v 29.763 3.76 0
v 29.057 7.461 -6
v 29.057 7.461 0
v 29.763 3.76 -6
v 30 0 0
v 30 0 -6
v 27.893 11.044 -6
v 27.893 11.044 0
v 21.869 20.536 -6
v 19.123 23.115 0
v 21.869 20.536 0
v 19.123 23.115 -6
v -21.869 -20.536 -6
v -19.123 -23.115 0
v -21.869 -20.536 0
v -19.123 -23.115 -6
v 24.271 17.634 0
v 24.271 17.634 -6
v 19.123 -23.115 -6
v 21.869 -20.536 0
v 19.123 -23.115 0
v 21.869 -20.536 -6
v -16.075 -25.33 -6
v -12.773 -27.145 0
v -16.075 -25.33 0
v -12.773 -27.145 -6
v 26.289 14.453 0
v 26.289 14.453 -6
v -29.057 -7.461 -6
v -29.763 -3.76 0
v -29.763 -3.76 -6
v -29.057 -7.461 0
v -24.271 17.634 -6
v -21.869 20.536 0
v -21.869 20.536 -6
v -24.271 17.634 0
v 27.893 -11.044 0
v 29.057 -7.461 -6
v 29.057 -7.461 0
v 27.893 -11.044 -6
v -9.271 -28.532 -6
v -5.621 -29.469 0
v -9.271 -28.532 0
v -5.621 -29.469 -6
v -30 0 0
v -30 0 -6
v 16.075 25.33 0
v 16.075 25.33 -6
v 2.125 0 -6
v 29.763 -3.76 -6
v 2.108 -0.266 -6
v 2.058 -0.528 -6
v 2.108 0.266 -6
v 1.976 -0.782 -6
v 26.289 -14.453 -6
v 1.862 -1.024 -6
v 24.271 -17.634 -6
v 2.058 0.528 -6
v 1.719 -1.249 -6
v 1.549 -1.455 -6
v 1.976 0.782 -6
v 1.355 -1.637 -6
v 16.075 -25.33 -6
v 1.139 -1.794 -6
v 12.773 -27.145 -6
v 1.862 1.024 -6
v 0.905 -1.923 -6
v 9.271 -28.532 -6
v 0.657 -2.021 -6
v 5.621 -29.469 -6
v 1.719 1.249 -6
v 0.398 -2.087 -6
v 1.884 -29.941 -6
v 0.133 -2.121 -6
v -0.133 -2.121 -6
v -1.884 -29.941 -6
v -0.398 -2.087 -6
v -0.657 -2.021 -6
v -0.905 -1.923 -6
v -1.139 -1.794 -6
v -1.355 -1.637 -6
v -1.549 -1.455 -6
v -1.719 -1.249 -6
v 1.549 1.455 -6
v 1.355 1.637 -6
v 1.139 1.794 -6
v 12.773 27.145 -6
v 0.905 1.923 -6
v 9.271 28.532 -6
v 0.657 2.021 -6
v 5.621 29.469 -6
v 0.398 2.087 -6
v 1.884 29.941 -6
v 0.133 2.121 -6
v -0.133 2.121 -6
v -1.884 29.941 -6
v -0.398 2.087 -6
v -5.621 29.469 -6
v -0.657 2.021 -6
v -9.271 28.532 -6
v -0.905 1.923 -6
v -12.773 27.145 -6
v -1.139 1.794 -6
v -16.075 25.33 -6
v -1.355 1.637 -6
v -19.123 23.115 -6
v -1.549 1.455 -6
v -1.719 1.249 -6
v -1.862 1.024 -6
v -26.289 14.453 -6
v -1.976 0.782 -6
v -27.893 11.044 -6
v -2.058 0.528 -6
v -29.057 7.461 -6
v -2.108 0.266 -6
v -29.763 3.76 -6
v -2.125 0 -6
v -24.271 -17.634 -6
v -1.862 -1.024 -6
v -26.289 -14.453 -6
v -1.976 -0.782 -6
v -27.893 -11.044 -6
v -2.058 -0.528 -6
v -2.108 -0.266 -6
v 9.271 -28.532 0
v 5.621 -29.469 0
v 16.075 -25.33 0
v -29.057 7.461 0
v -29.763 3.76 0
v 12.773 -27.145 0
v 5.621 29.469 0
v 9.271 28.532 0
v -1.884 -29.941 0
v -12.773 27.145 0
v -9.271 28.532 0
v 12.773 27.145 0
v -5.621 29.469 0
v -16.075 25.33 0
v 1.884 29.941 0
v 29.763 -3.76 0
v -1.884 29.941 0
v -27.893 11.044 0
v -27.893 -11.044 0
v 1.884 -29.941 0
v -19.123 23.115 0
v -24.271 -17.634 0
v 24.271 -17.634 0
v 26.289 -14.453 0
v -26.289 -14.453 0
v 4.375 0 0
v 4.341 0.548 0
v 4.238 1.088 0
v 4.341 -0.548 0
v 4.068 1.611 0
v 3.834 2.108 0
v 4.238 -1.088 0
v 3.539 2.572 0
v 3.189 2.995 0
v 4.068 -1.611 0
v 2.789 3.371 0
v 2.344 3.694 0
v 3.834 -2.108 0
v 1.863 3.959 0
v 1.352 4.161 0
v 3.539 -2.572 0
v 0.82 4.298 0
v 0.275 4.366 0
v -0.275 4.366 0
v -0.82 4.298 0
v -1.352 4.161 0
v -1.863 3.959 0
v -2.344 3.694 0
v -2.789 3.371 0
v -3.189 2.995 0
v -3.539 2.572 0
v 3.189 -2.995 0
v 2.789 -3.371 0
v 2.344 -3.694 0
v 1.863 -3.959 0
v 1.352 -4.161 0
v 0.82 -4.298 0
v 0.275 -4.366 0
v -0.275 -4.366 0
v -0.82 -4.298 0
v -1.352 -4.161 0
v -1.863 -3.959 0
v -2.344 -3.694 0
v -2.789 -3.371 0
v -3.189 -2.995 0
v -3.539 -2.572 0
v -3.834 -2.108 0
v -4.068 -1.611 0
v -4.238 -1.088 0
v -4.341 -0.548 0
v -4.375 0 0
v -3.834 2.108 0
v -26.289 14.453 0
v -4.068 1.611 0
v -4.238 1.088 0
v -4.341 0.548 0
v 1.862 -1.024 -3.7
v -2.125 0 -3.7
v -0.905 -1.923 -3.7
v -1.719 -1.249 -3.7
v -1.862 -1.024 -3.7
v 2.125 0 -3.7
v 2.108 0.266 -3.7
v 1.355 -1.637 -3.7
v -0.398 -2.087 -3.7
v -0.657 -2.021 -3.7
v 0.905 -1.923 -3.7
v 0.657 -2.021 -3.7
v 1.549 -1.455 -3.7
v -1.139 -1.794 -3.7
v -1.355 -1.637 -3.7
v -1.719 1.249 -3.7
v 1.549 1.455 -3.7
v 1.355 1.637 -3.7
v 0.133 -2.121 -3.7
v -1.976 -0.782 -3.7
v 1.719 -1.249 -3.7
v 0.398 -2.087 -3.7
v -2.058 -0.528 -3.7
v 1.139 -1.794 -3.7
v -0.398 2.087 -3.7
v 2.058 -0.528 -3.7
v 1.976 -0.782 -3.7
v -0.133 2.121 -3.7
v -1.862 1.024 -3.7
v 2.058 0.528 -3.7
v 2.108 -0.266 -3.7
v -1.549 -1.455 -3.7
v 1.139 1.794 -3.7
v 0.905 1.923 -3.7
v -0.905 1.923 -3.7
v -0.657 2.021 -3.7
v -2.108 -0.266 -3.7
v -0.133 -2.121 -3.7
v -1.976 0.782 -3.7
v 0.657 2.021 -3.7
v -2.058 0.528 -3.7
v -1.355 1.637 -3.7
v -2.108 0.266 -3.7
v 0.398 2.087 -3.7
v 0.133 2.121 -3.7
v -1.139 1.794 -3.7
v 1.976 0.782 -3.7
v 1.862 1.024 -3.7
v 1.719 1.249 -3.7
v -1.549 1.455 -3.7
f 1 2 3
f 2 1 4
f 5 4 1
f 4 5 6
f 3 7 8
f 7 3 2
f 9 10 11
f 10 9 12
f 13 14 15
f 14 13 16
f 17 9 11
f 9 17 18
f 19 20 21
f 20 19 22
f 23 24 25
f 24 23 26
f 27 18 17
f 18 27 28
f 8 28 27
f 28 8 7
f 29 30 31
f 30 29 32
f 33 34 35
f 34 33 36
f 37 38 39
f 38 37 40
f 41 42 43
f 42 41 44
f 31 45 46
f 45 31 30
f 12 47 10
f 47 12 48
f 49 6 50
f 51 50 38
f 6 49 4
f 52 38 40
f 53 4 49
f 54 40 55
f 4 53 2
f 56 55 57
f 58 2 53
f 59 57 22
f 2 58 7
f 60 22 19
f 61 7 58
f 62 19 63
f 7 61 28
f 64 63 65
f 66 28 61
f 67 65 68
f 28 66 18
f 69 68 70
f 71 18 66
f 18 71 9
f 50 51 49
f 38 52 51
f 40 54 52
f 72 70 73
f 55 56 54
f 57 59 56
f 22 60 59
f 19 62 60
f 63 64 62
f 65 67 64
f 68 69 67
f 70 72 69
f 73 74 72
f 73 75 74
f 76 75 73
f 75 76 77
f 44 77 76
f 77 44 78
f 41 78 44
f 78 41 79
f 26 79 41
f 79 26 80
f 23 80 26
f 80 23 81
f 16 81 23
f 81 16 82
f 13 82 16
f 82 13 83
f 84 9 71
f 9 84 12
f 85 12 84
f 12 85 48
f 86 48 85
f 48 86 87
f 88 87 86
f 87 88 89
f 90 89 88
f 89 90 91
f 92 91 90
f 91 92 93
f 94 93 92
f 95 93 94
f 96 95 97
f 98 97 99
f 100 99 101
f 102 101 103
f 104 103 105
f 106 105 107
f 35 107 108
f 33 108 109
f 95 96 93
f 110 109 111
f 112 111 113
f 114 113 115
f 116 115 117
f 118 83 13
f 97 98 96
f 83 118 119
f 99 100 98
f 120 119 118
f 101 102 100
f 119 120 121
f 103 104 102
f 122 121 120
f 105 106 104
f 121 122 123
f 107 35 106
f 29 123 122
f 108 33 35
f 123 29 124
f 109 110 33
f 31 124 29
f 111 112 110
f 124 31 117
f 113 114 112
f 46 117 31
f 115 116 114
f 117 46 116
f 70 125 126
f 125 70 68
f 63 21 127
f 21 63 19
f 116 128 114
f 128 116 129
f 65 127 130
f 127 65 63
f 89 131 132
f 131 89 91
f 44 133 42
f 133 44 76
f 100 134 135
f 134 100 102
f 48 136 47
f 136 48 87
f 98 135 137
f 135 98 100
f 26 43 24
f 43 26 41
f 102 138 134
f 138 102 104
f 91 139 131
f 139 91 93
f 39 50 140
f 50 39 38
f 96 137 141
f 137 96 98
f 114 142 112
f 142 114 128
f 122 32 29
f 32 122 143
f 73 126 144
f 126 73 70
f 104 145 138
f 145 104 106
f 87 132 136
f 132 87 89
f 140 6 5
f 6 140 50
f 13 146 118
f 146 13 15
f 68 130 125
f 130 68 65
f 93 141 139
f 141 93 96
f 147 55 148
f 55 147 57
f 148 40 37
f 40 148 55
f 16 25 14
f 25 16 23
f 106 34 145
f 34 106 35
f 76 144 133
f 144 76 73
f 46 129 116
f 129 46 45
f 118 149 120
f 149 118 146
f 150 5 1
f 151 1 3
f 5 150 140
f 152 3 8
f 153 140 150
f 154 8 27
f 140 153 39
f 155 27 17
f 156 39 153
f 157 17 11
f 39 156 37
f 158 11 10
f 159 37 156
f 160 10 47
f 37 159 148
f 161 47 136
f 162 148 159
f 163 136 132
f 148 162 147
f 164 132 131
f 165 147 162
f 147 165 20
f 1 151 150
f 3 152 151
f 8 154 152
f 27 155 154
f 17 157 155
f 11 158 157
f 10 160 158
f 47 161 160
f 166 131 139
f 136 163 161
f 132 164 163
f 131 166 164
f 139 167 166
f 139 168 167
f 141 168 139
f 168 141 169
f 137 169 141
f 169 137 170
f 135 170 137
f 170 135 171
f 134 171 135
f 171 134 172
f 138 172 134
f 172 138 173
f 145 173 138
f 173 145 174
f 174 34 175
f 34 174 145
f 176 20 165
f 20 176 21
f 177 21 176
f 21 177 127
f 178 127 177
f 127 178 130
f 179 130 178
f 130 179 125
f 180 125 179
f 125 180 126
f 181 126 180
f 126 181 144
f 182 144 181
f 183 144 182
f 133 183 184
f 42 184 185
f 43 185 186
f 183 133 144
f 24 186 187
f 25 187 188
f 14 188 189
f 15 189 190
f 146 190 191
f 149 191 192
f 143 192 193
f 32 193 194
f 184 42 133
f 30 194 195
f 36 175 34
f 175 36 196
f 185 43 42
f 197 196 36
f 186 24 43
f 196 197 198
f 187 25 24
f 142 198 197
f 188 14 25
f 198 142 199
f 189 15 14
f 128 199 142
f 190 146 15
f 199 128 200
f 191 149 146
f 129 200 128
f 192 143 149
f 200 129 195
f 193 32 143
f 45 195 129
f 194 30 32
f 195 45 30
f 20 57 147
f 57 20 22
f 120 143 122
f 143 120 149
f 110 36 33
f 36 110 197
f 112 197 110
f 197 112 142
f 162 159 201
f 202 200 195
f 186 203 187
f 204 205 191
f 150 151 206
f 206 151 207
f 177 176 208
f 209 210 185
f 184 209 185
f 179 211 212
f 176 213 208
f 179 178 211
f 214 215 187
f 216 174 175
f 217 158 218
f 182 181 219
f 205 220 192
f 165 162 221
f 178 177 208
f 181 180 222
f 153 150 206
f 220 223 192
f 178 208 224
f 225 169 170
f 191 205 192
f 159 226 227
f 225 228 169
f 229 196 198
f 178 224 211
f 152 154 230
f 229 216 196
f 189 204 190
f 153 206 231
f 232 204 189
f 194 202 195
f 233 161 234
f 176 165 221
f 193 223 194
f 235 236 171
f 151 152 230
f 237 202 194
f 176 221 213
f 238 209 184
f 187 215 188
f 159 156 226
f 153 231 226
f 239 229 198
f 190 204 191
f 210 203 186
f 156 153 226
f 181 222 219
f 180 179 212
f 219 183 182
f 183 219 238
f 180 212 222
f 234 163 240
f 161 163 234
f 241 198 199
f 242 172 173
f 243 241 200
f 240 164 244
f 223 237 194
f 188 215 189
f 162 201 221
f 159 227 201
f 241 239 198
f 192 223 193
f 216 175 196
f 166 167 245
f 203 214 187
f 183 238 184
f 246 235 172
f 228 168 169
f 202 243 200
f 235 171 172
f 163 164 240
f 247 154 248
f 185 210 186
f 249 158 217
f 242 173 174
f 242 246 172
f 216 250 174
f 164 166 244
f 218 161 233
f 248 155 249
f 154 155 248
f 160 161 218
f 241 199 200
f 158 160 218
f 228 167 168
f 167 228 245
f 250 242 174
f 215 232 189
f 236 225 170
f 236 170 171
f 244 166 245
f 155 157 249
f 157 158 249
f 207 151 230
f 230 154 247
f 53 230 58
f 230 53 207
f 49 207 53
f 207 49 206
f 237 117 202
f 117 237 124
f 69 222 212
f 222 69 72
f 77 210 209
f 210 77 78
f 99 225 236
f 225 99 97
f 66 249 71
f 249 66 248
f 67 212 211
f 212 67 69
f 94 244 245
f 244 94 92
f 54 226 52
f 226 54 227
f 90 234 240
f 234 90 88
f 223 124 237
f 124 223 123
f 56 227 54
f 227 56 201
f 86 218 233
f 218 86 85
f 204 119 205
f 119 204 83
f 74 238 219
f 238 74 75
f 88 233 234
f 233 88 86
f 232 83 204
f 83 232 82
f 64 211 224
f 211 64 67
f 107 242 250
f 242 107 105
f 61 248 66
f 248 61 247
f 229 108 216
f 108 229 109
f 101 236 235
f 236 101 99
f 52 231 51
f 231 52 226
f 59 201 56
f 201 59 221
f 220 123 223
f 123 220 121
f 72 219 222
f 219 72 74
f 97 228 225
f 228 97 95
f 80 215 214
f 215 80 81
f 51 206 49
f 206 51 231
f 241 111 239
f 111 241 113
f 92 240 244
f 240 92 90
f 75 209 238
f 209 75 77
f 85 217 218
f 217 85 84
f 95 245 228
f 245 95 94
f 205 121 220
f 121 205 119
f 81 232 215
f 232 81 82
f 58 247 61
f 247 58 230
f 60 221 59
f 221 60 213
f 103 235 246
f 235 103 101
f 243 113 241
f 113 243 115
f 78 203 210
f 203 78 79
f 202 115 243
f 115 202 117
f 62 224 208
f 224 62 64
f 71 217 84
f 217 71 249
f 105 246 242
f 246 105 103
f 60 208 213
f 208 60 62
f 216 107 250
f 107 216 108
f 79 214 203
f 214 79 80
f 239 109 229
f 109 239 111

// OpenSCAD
$fn = 50;


difference() {
	union() {
		translate(v = [0, 0, -6.0000000000]) {
			cylinder(h = 6, r = 30.0000000000);
		}
		translate(v = [0, 0, -6.0000000000]) {
			cylinder(h = 6, r = 2.8750000000);
		}
	}
	union() {
		translate(v = [0, 0, 0]) {
			rotate(a = [0, 0, 0]) {
				difference() {
					union() {
						translate(v = [0, 0, -6.0000000000]) {
							cylinder(h = 6, r = 2.0000000000);
						}
						translate(v = [0, 0, -3.7000000000]) {
							cylinder(h = 3.7000000000, r1 = 2.1250000000, r2 = 4.3750000000);
						}
						translate(v = [0, 0, -6.0000000000]) {
							cylinder(h = 6, r = 2.1250000000);
						}
						translate(v = [0, 0, -6.0000000000]) {
							cylinder(h = 6, r = 2.0000000000);
						}
					}
					union();
				}
			}
		}
	}
}
